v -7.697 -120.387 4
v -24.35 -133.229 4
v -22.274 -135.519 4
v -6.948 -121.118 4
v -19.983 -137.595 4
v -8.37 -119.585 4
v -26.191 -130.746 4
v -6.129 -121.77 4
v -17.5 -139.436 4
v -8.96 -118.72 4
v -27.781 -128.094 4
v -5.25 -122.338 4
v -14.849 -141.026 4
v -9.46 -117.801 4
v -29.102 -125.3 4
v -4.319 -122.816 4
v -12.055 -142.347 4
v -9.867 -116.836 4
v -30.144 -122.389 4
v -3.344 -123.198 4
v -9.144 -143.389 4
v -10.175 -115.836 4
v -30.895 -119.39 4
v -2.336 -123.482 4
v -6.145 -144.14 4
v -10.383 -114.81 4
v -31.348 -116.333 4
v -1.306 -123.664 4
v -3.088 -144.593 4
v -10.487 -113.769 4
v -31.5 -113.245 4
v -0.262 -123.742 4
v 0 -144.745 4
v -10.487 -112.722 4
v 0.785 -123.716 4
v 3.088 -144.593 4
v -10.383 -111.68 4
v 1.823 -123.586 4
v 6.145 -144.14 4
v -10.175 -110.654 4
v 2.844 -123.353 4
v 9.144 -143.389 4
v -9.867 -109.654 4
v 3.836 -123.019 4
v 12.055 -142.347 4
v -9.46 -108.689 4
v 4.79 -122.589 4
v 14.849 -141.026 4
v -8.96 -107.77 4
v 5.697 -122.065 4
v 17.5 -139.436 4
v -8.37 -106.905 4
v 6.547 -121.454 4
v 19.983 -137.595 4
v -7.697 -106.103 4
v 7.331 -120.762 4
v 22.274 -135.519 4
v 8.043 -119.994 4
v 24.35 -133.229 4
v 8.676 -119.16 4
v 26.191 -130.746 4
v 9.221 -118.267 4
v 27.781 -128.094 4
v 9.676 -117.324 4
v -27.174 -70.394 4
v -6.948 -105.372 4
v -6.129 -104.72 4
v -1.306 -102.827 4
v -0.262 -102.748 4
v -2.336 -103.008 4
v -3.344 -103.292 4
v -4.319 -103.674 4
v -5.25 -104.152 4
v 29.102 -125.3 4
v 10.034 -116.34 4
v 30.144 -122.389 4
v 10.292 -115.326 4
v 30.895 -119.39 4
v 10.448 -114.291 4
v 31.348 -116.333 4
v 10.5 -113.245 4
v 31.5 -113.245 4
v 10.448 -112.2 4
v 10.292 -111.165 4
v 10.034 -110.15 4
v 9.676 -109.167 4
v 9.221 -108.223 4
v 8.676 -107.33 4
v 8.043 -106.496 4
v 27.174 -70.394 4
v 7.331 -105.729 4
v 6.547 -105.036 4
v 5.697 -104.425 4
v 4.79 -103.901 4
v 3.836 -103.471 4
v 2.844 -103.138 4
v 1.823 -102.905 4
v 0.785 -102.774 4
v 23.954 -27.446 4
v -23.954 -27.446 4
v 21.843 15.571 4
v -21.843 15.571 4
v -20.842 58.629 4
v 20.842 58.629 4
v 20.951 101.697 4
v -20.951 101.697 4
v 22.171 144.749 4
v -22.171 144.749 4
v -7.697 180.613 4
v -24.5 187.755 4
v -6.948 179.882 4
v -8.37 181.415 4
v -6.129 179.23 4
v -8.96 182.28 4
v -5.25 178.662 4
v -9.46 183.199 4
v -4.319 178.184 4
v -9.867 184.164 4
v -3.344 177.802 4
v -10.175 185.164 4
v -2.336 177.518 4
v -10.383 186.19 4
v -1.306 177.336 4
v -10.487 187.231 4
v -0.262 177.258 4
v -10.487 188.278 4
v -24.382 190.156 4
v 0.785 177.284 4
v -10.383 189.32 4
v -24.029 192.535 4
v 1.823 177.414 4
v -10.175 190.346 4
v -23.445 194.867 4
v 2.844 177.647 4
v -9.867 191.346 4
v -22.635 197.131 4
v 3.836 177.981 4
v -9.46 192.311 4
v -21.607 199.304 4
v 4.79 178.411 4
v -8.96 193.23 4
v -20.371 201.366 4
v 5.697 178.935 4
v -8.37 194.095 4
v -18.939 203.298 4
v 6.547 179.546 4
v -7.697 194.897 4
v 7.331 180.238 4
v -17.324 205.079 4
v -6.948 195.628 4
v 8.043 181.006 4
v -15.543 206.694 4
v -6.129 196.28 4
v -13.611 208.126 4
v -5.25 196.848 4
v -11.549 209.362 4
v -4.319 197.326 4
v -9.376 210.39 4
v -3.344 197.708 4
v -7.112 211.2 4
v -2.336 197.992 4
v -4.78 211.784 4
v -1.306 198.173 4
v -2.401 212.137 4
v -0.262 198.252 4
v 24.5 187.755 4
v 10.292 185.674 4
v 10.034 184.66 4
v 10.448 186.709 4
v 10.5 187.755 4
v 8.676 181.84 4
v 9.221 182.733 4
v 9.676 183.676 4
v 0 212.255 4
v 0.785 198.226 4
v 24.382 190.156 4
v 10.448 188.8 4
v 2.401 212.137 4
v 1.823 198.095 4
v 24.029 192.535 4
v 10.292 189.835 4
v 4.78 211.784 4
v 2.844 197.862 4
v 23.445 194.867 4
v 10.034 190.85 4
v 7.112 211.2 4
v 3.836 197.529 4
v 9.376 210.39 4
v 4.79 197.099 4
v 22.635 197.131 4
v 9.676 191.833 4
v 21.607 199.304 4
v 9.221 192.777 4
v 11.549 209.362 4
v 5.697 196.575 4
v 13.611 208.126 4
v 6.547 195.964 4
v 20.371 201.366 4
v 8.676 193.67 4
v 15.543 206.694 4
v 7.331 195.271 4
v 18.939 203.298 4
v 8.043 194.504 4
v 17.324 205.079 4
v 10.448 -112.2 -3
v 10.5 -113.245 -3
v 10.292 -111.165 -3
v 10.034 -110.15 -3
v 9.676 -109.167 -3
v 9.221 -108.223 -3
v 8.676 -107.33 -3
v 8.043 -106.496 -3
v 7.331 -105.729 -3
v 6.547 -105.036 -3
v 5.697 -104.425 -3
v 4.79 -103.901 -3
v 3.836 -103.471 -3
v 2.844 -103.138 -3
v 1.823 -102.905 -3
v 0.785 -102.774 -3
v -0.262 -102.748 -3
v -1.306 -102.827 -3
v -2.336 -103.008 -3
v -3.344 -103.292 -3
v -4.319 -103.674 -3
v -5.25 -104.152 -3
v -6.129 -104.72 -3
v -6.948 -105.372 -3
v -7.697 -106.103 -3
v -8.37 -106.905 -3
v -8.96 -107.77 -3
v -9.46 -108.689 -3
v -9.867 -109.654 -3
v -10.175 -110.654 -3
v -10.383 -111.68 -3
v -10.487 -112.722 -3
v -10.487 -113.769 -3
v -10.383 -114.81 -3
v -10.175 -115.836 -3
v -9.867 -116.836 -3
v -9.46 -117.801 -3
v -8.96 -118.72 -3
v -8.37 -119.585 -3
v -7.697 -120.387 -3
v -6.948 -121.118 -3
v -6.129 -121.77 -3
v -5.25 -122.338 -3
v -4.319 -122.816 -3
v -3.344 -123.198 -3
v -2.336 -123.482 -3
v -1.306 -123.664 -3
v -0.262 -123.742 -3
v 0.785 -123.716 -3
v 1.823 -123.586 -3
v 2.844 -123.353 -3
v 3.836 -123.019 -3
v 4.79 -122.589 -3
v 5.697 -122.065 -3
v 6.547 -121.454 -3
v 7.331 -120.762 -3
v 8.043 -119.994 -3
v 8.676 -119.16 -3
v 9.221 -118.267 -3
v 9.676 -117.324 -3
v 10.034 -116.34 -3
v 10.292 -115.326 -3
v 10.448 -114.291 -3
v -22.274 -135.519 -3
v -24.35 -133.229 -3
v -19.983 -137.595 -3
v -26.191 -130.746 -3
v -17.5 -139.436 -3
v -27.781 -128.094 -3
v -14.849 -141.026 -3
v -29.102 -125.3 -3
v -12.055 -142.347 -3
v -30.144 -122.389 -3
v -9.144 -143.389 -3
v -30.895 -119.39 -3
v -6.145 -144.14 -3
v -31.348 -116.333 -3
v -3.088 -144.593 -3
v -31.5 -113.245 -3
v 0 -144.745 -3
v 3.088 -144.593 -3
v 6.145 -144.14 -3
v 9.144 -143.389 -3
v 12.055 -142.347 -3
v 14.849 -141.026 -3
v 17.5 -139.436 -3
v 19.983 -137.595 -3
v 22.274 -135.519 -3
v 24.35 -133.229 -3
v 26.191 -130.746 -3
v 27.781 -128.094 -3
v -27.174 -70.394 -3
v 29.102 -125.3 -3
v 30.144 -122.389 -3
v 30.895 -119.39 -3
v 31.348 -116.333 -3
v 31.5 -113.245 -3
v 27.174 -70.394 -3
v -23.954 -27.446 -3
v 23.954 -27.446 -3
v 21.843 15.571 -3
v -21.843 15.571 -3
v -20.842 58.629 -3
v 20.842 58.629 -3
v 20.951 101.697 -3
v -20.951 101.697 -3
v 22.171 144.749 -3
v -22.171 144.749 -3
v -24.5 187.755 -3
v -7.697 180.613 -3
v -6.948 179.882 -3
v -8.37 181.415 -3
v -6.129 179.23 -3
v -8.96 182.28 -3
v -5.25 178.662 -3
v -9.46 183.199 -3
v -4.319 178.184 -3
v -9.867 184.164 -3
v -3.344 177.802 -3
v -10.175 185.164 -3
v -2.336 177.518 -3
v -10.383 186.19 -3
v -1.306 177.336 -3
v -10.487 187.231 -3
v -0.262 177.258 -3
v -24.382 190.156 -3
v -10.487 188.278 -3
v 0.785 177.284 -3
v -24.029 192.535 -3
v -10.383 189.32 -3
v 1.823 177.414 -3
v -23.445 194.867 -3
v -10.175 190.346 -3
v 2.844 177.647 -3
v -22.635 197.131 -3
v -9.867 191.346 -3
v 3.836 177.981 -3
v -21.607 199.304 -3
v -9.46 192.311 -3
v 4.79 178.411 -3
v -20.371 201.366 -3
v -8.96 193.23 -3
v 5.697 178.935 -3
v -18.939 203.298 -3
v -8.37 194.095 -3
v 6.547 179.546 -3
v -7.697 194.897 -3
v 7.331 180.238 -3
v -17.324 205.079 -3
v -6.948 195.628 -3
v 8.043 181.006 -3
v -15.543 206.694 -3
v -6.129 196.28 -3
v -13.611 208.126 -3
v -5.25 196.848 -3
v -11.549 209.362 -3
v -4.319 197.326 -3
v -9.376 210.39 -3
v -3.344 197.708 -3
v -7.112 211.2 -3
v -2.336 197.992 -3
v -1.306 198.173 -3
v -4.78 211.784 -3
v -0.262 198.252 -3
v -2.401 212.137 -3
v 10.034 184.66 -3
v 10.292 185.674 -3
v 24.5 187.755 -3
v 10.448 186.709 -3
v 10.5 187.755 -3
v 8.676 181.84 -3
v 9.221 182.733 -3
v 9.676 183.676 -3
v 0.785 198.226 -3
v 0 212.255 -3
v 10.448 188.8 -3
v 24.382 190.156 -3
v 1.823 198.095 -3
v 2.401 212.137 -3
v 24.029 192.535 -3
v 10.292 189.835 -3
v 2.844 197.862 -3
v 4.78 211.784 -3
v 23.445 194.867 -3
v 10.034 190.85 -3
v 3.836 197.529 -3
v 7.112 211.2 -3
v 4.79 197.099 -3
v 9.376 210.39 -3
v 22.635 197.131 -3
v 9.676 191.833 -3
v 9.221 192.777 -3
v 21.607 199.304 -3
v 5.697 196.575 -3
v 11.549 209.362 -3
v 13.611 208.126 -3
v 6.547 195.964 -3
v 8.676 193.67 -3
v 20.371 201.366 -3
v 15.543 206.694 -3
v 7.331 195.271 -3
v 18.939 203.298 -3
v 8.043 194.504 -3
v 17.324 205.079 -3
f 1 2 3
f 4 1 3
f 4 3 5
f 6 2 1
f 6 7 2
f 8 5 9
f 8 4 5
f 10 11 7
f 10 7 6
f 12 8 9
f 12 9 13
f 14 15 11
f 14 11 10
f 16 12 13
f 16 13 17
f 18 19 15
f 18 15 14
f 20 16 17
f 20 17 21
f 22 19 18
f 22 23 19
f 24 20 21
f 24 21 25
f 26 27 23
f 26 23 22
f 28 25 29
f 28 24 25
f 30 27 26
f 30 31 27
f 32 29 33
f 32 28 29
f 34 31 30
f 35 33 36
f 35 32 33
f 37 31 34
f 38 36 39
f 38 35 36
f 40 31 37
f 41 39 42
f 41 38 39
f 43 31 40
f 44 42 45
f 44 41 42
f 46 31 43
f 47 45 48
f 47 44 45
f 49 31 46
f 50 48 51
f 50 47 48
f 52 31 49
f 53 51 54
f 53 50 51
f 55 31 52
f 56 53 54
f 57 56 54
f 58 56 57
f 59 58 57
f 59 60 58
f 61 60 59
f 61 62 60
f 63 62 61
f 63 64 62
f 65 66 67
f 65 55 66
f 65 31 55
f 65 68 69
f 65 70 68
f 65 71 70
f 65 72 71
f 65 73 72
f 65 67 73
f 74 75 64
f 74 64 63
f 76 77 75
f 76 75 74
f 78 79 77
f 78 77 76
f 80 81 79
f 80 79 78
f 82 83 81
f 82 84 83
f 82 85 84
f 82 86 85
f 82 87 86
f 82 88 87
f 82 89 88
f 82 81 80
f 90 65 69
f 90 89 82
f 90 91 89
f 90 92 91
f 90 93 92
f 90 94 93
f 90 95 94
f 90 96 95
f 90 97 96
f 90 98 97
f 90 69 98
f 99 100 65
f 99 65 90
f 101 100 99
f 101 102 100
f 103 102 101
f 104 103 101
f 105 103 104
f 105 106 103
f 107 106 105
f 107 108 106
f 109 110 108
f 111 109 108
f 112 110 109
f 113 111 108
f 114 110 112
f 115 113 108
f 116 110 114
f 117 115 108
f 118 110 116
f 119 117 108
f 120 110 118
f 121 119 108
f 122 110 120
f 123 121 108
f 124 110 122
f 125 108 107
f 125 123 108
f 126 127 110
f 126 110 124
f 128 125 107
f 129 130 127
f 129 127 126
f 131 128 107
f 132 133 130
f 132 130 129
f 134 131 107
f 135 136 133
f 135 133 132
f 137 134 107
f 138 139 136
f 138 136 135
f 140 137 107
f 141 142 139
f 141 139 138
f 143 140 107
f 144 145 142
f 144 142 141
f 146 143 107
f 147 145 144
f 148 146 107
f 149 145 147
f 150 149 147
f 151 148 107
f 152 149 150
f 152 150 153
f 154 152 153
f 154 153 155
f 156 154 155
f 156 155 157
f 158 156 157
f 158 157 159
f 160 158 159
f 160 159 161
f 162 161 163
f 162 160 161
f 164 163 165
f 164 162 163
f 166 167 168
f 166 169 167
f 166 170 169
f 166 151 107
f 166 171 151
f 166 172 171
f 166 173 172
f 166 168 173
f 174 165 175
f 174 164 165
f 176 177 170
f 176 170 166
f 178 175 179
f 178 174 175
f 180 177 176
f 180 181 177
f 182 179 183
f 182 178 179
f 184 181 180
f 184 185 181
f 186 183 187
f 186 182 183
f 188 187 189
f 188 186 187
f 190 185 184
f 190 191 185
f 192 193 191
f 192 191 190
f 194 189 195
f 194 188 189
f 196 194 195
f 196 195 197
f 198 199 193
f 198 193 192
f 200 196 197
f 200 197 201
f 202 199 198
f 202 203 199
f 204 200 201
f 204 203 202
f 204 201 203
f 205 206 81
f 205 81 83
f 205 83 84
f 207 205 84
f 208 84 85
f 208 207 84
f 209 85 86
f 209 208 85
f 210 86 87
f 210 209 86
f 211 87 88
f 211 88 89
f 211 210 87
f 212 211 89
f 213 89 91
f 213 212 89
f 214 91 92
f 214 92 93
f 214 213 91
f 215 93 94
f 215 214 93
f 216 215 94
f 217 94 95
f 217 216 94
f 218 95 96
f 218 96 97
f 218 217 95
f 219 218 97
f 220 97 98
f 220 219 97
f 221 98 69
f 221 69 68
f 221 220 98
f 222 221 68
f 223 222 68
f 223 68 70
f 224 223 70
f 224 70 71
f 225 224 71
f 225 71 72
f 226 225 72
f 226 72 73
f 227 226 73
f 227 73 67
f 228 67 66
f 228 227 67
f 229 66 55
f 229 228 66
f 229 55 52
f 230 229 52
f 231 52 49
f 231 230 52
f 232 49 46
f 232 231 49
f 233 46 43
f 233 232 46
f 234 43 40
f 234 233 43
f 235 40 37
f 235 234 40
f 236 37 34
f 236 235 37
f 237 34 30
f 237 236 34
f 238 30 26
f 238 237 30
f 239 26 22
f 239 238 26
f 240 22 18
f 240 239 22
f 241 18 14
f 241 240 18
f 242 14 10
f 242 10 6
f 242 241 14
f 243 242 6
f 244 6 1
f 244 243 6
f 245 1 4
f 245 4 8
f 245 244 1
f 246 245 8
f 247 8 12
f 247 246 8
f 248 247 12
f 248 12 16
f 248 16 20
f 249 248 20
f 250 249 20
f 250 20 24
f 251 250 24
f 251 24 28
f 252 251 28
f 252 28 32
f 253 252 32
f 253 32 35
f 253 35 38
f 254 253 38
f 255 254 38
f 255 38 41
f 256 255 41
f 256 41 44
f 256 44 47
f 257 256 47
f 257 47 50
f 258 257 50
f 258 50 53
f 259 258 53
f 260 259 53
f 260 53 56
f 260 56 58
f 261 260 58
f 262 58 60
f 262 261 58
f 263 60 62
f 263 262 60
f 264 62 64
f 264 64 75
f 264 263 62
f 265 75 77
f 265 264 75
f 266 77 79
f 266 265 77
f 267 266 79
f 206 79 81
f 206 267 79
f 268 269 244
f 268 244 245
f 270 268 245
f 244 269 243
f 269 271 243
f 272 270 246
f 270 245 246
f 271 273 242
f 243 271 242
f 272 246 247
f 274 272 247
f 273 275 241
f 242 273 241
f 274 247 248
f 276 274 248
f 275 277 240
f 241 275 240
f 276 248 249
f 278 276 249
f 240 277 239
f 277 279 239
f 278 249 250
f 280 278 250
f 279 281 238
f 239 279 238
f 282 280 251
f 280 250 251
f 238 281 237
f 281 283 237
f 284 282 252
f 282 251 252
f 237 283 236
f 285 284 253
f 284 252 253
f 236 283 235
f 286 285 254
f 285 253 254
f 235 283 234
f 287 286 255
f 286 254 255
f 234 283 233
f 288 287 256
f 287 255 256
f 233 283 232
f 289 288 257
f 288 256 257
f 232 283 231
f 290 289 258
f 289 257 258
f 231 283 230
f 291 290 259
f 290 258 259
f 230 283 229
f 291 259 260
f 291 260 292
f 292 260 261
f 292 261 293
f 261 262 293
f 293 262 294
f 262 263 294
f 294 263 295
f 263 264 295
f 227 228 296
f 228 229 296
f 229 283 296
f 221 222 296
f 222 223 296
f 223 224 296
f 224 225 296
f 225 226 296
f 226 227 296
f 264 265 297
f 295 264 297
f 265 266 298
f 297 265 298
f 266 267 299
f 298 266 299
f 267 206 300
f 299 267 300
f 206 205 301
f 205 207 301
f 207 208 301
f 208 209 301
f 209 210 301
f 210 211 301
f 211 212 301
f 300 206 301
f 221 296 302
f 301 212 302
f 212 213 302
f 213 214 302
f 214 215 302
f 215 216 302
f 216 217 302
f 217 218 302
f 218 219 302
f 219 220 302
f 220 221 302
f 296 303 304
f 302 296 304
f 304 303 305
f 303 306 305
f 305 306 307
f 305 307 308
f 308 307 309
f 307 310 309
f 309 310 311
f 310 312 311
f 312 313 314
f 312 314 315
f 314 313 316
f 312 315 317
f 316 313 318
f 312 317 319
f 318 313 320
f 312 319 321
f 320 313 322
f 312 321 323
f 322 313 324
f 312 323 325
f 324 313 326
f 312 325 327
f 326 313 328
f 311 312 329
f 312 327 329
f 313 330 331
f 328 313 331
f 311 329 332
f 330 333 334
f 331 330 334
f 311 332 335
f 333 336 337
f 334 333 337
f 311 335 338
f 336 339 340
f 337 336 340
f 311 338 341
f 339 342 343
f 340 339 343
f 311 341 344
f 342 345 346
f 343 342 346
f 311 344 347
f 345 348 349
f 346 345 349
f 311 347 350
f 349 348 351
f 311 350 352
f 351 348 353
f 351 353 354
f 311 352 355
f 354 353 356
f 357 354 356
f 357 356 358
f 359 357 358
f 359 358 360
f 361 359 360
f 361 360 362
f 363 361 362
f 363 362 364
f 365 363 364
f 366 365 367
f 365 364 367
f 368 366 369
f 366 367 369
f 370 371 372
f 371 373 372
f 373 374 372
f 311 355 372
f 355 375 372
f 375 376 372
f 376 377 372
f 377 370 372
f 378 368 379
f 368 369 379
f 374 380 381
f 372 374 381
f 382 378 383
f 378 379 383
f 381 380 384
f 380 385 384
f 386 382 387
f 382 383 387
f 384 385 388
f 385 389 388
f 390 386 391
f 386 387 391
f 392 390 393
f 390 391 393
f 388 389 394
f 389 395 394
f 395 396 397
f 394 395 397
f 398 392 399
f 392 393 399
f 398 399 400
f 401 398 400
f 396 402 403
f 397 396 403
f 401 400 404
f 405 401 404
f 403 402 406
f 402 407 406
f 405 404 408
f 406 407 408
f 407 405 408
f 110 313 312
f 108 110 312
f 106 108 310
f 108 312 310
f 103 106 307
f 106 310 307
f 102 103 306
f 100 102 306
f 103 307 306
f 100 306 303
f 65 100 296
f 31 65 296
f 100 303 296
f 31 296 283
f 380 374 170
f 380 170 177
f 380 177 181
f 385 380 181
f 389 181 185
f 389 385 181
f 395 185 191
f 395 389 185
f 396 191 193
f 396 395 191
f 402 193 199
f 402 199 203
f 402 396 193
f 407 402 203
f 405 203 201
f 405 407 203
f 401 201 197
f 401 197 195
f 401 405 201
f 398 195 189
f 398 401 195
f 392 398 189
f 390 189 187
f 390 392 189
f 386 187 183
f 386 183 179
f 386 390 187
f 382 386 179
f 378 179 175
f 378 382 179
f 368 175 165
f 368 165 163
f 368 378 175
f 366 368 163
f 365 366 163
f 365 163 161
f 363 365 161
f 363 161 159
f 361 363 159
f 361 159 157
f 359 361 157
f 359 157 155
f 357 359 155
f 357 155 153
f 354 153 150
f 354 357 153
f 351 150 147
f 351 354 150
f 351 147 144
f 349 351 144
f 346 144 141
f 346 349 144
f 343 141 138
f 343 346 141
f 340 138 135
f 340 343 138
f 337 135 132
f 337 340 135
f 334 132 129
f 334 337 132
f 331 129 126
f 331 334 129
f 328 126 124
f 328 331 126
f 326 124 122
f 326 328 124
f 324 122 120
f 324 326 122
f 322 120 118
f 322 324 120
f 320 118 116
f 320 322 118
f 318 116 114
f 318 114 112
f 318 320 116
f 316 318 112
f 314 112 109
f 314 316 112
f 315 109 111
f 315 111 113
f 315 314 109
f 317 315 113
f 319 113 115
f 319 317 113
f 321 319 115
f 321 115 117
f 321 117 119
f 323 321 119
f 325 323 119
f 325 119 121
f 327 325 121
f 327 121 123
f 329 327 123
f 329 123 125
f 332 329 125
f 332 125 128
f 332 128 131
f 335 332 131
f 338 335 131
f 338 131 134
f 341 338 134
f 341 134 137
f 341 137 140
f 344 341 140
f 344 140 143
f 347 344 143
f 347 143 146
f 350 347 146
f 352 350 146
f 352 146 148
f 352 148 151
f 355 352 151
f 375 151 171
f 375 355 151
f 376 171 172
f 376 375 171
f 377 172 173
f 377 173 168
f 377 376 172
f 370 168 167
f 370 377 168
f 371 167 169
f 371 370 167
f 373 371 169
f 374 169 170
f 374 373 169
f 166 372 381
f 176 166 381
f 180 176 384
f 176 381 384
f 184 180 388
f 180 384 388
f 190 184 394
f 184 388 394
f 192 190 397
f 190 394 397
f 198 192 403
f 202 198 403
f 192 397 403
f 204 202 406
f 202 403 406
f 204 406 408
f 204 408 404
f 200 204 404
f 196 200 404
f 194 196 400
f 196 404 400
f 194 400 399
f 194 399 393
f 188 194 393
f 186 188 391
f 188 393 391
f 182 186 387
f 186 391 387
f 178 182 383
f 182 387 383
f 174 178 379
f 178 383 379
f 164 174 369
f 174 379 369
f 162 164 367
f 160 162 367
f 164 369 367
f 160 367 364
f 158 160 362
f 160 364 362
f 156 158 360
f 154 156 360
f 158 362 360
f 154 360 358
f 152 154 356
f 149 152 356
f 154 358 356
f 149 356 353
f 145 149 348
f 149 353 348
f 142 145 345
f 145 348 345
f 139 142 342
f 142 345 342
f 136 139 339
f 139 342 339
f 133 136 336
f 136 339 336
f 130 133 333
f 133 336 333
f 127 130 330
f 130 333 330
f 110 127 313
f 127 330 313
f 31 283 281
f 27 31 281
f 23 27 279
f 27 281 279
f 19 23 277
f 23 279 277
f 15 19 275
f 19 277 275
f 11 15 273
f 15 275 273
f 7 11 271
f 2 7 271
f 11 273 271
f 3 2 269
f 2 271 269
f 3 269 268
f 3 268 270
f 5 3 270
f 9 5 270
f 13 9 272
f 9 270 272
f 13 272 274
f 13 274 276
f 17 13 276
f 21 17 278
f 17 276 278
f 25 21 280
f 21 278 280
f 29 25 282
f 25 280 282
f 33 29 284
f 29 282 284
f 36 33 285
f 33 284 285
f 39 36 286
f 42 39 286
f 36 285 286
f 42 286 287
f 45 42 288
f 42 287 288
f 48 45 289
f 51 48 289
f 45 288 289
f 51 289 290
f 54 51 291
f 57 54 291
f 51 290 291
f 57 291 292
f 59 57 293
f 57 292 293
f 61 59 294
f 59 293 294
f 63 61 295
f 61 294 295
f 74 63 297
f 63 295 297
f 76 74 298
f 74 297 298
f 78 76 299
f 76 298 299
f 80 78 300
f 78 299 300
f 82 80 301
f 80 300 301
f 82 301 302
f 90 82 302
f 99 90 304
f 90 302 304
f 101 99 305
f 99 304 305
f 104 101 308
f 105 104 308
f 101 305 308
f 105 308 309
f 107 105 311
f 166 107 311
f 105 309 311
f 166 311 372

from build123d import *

# Parameters (mm, degrees)
CROQUIS2_R              = 1.5
SALIENTE_EXTRUIR1_DEPTH = 1
ESCALA1_SCALE           = 7


with BuildPart() as part:
    # Croquis2 → Saliente-Extruir1 (new body)
    with BuildSketch(Plane.XY):
        with BuildLine():
            ThreePointArc((3.5, 47.5), (0, 51), (-3.5, 47.5))
            ThreePointArc((-3.5, 47.5), (-3.029104107, 25.977421026), (-4.5, 4.5))
            ThreePointArc((-4.5, 4.5), (0, 0), (4.5, 4.5))
            ThreePointArc((4.5, 4.5), (3.029104107, 25.977421026), (3.5, 47.5))
        make_face()
        with Locations((0, 47.5)):
            Circle(CROQUIS2_R, mode=Mode.SUBTRACT)
        with Locations((0, 4.5)):
            Circle(CROQUIS2_R, mode=Mode.SUBTRACT)
    extrude(amount=SALIENTE_EXTRUIR1_DEPTH)


with BuildPart() as part_1:
    # Escala1: scaled about (0, 24.124187823, 0.5)
    add(part.part.scale(ESCALA1_SCALE).moved(Location((0, -144.745126938, -3))))


solid = part_1.part
